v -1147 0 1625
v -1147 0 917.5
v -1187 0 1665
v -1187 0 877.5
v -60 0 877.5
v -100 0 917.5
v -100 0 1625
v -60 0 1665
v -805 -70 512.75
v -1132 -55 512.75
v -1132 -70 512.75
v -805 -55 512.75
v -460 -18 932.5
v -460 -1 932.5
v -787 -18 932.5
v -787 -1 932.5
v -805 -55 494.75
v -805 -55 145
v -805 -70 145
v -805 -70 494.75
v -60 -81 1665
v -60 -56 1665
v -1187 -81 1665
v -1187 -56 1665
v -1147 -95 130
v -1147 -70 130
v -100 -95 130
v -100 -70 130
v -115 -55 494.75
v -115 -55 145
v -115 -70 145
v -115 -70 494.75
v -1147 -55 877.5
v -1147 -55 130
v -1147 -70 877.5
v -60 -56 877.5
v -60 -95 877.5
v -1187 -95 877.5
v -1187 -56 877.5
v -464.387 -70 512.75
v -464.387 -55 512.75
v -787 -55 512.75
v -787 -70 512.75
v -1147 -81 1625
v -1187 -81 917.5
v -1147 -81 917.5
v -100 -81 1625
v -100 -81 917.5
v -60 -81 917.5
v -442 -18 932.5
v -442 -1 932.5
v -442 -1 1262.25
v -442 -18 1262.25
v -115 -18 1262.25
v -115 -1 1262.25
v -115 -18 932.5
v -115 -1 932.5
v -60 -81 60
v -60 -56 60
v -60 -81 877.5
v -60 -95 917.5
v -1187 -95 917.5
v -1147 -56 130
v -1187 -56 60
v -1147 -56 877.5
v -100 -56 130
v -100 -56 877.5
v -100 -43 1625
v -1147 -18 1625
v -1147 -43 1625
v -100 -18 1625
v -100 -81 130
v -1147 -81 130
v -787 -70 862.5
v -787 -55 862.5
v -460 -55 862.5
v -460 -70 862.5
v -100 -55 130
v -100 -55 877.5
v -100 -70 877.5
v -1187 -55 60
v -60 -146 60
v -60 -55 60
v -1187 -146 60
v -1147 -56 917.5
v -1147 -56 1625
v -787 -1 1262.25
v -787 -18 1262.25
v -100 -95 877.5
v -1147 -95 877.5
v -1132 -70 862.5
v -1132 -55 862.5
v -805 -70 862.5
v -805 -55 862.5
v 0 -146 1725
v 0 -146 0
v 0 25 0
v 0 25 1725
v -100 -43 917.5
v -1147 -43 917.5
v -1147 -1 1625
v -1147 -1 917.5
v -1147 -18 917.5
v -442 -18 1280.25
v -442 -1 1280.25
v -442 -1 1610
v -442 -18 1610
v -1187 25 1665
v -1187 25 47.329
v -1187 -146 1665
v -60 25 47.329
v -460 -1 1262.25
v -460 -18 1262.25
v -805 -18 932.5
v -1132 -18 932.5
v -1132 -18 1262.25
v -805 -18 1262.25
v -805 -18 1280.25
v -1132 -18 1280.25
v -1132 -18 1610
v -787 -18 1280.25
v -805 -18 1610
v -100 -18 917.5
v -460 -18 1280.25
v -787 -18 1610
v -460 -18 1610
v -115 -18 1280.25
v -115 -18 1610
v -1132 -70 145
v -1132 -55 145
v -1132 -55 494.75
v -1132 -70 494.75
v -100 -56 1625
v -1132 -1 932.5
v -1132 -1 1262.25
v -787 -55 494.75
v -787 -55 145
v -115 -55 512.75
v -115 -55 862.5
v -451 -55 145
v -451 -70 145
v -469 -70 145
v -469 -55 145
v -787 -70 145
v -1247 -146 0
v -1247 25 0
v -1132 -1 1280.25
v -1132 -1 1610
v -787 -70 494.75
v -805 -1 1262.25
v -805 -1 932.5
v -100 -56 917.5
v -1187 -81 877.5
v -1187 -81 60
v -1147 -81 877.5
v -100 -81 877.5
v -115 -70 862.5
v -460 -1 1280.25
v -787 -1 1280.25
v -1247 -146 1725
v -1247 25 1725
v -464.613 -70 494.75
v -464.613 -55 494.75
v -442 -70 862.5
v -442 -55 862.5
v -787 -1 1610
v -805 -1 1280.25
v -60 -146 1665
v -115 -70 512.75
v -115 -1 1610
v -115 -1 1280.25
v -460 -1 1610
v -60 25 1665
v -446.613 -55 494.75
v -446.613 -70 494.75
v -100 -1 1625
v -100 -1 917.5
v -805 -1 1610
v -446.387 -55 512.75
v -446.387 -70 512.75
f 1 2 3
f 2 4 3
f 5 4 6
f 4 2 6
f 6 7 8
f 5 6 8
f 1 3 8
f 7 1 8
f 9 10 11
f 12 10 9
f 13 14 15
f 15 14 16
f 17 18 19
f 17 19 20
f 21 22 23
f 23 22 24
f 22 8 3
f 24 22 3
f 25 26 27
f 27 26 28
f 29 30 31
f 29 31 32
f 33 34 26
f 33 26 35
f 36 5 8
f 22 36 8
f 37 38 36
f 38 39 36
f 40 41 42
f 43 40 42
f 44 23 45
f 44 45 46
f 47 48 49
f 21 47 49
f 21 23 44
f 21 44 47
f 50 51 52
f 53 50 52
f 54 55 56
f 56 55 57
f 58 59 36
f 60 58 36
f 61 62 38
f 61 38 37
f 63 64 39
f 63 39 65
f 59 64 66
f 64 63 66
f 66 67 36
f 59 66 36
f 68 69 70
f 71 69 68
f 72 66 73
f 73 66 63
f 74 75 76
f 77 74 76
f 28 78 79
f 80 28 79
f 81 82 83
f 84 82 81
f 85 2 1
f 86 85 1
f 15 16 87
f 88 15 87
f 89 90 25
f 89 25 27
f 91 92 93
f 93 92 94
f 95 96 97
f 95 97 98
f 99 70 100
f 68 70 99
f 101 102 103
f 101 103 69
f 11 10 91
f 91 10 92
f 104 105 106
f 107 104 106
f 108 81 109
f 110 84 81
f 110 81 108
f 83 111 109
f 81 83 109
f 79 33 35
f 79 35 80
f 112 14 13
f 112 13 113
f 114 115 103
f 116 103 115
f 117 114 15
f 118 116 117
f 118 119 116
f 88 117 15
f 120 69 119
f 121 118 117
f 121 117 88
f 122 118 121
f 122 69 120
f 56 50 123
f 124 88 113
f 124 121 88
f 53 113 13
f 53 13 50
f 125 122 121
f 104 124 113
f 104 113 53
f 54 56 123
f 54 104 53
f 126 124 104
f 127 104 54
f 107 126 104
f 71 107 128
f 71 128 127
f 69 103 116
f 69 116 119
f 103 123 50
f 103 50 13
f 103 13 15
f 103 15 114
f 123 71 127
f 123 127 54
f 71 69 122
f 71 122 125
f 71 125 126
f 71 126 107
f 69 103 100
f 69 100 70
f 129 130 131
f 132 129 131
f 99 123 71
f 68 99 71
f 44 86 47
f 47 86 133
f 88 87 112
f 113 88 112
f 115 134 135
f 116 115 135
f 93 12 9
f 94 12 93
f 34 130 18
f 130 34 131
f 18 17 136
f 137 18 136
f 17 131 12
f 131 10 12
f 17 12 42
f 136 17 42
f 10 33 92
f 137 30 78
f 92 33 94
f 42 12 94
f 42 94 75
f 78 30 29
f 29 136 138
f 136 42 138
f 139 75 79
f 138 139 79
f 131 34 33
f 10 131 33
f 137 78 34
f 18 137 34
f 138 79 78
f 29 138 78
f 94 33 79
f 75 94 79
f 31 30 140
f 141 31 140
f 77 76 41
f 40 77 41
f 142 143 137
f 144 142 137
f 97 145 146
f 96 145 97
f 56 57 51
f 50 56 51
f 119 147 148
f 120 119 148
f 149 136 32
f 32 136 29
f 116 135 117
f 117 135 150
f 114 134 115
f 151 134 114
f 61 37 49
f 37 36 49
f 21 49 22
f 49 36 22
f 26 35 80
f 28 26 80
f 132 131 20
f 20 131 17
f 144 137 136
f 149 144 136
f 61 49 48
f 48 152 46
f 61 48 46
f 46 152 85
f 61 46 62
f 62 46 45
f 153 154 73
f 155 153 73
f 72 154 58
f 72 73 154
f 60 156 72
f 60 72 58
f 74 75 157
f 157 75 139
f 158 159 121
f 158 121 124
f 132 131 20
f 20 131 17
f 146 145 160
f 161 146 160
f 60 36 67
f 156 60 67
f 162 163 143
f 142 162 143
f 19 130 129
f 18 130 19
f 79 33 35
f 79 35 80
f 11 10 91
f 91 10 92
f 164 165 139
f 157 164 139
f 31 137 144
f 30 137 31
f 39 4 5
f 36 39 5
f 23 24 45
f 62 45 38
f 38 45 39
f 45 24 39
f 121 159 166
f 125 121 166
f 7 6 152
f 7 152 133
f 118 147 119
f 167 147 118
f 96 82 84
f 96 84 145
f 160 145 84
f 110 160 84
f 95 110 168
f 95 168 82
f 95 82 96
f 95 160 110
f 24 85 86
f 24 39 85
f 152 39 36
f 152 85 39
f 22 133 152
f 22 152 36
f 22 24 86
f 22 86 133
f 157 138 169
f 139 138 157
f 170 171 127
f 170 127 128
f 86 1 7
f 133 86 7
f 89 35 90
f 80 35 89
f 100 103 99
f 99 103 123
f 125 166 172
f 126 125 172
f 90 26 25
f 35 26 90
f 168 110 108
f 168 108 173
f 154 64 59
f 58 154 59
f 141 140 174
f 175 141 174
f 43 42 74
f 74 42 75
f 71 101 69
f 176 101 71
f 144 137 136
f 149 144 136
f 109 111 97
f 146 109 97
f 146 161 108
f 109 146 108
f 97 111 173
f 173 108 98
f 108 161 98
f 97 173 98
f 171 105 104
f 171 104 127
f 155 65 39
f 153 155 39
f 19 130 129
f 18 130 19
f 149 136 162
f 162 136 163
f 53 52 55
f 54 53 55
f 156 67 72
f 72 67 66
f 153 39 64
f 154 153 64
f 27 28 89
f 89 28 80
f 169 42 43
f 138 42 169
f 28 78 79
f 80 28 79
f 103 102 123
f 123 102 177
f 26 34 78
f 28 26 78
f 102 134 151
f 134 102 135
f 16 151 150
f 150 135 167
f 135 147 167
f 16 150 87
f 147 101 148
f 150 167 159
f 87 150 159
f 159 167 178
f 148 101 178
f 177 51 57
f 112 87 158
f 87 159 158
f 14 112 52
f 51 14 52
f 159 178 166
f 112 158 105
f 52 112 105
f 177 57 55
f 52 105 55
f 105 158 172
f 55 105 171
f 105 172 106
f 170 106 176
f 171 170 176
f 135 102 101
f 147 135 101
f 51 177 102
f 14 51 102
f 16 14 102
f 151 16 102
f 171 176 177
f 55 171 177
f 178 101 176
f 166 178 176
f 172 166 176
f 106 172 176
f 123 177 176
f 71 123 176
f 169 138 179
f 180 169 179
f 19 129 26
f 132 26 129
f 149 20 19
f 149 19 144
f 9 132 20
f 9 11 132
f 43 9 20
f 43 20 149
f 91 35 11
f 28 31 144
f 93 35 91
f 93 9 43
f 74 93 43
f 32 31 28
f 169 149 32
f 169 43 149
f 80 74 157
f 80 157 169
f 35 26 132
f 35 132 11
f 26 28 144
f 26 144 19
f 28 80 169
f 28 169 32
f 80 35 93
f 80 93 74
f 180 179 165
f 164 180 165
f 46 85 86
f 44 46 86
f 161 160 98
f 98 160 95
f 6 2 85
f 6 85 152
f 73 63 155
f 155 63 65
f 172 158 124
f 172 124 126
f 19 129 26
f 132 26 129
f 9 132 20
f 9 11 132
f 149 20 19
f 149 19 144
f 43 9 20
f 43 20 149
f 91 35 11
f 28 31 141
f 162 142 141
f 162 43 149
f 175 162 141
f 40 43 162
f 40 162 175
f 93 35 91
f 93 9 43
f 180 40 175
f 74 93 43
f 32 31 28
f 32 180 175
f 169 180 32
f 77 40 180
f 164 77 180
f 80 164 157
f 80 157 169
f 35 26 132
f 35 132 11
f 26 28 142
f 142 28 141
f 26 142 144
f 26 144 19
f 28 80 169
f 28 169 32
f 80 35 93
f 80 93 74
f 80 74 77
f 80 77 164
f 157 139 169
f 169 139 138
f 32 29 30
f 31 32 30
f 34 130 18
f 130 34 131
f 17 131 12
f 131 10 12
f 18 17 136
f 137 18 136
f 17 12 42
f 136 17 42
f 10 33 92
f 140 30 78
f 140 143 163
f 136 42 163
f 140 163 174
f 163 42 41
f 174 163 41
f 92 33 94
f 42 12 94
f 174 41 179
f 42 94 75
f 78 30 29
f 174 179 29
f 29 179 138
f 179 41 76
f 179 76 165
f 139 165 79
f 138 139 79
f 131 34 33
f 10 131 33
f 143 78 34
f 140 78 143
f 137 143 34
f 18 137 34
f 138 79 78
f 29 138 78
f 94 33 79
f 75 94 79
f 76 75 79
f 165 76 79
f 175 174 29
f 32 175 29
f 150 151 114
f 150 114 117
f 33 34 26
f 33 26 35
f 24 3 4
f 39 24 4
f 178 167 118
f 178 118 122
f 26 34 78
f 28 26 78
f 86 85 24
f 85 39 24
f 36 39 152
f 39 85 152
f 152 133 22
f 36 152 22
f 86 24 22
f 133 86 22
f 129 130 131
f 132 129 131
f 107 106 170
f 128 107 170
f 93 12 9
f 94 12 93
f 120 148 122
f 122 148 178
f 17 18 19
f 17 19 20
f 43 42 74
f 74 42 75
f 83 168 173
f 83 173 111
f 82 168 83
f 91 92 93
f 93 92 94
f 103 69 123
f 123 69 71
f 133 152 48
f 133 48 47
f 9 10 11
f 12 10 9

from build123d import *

# Parameters (mm, degrees)
F0_W          = 1247
F0_H          = 1725
F1_DEPTH      = 146
F1_DEPTH_BACK = 25
F0_W_2        = 1047
F0_H_2        = 707.5
F2_DEPTH      = 56
F3_START      = 56
F3_DEPTH      = 25
F4_START      = 1
F0_W_3        = 327
F0_H_3        = 329.75
F0_W_4        = 18
F4_DEPTH      = 17
F6_START      = 55
F5_W          = 1047
F5_H          = 747.5
F5_W_2        = 327
F5_H_2        = 349.75
F5_W_3        = 672
F6_DEPTH      = 15
F0_H_4        = 747.5
F0_H_5        = 349.75
F7_SIZE2      = 12.670755226
F7_SIZE       = 80
F8_W          = 1047
F8_H          = 747.5
F8_W_2        = 327
F8_H_2        = 349.75
F8_W_3        = 672
F9_DEPTH      = 25
F10_DEPTH     = 25
F12_DEPTH     = 14
F13_W         = 1047
F13_H         = 707.5
F14_DEPTH     = 25


with BuildPart() as f1:
    # F0 (on Front) → F1 (new body, two sides)
    with BuildSketch(Plane.XZ) as f1_sk:
        with Locations((-623.5, 862.5)):
            Rectangle(F0_W, F0_H)
        Polygon((-1187, 1665), (-60, 1665), (-60, 877.5), (-60, 60), (-1187, 60), (-1187, 877.5), align=None, mode=Mode.SUBTRACT)
    extrude(amount=F1_DEPTH)
    extrude(f1_sk.sketch, amount=-F1_DEPTH_BACK)

    # F7
    f7_edges = [f1.edges().sort_by_distance(p)[0] for p in [
        (-623.5, 25, 60),
    ]]
    f7_side = f1.faces().sort_by_distance((-623.5, -60.5, 60))[0]
    chamfer(f7_edges, length=F7_SIZE, length2=F7_SIZE2, reference=f7_side)


with BuildPart() as f2:
    # F0 (on Front) → F2 (new body)
    with BuildSketch(Plane.XZ):
        Polygon((-60, 877.5), (-60, 1665), (-1187, 1665), (-1187, 877.5), (-1147, 877.5), (-100, 877.5), align=None)
        with Locations((-623.5, 1271.25)):
            Rectangle(F0_W_2, F0_H_2, mode=Mode.SUBTRACT)
    extrude(amount=F2_DEPTH)


with BuildPart() as f3:
    # F0 (on Front) → F3 (new body)
    with BuildSketch(Plane.XZ.offset(F3_START)):
        Polygon((-60, 60), (-60, 877.5), (-100, 877.5), (-100, 130), (-1147, 130), (-1147, 877.5), (-1187, 877.5), (-1187, 60), align=None)
    extrude(amount=F3_DEPTH)


with BuildPart() as f4:
    # F0 (on Front) → F4 (new body)
    with BuildSketch(Plane.XZ.offset(F4_START)):
        with Locations((-623.5, 1271.25)):
            Rectangle(F0_W_2, F0_H_2)
        with Locations((-968.5, 1097.375)):
            Rectangle(F0_W_3, F0_H_3, mode=Mode.SUBTRACT)
        with Locations((-968.5, 1445.125)):
            Rectangle(F0_W_3, F0_H_3, mode=Mode.SUBTRACT)
        Polygon((-442, 1262.25), (-115, 1262.25), (-115, 932.5), (-442, 932.5), (-460, 932.5), (-787, 932.5), (-787, 1262.25), (-460, 1262.25), align=None, mode=Mode.SUBTRACT)
        with Locations((-623.5, 1445.125)):
            Rectangle(F0_W_3, F0_H_3, mode=Mode.SUBTRACT)
        with Locations((-278.5, 1445.125)):
            Rectangle(F0_W_3, F0_H_3, mode=Mode.SUBTRACT)
        with Locations((-451, 1097.375)):
            Rectangle(F0_W_4, F0_H_3)
    extrude(amount=F4_DEPTH)


with BuildPart() as f6:
    # F5 (on face) → F6 (new body)
    with BuildSketch(Plane.XZ.offset(F6_START)):
        with Locations((-623.5, 503.75)):
            Rectangle(F5_W, F5_H)
        with Locations((-968.5, 319.875)):
            Rectangle(F5_W_2, F5_H_2, mode=Mode.SUBTRACT)
        with Locations((-451, 319.875)):
            Rectangle(F5_W_3, F5_H_2, mode=Mode.SUBTRACT)
        with Locations((-968.5, 687.625)):
            Rectangle(F5_W_2, F5_H_2, mode=Mode.SUBTRACT)
        with Locations((-451, 687.625)):
            Rectangle(F5_W_3, F5_H_2, mode=Mode.SUBTRACT)
    extrude(amount=F6_DEPTH)


with BuildPart() as f6b:
    # F0 (on Front) → F6, piece 2 (new body)
    with BuildSketch(Plane.XZ.offset(F6_START)):
        with Locations((-623.5, 503.75)):
            Rectangle(F0_W_2, F0_H_4)
        with Locations((-968.5, 319.875)):
            Rectangle(F0_W_3, F0_H_5, mode=Mode.SUBTRACT)
        Polygon((-787, 145), (-787, 494.75), (-464.6128919861, 494.75), (-469, 145), align=None, mode=Mode.SUBTRACT)
        with Locations((-968.5, 687.625)):
            Rectangle(F0_W_3, F0_H_5, mode=Mode.SUBTRACT)
        Polygon((-446.6128919861, 494.75), (-115, 494.75), (-115, 145), (-451, 145), align=None, mode=Mode.SUBTRACT)
        Polygon((-787, 512.75), (-787, 862.5), (-460, 862.5), (-464.3871080139, 512.75), align=None, mode=Mode.SUBTRACT)
        Polygon((-442, 862.5), (-115, 862.5), (-115, 512.75), (-446.3871080139, 512.75), align=None, mode=Mode.SUBTRACT)
    extrude(amount=F6_DEPTH)


with BuildPart() as f9:
    # F8 (on face) → F9 (new body)
    with BuildSketch(Plane.XZ.offset(70)):
        with Locations((-623.5, 503.75)):
            Rectangle(F8_W, F8_H)
        with Locations((-968.5, 319.875)):
            Rectangle(F8_W_2, F8_H_2, mode=Mode.SUBTRACT)
        with Locations((-451, 319.875)):
            Rectangle(F8_W_3, F8_H_2, mode=Mode.SUBTRACT)
        with Locations((-968.5, 687.625)):
            Rectangle(F8_W_2, F8_H_2, mode=Mode.SUBTRACT)
        with Locations((-451, 687.625)):
            Rectangle(F8_W_3, F8_H_2, mode=Mode.SUBTRACT)
        with Locations((-968.5, 687.625)):
            Rectangle(F8_W_2, F8_H_2)
        with Locations((-451, 687.625)):
            Rectangle(F8_W_3, F8_H_2)
        with Locations((-968.5, 319.875)):
            Rectangle(F8_W_2, F8_H_2)
        with Locations((-451, 319.875)):
            Rectangle(F8_W_3, F8_H_2)
    extrude(amount=F9_DEPTH)


with BuildPart() as f10:
    # F10 (new): a face of the model
    f10_faces = [f2.part.faces().sort_by_distance(p)[0] for p in [
        (-73.7487644899, -56, 1271.25),
    ]]
    extrude(f10_faces, amount=F10_DEPTH)

    # F11 (on face) → F12 (join, through all)
    with BuildSketch(Plane.XZ.offset(81)):
        Polygon((-100, 917.5), (-1147, 917.5), (-1187, 917.5), (-1187, 877.5), (-60, 877.5), (-60, 917.5), align=None)
    extrude(amount=F12_DEPTH)


with BuildPart() as f14:
    # F13 (on face) → F14 (new body)
    with BuildSketch(Plane.XZ.offset(18)):
        with Locations((-623.5, 1271.25)):
            Rectangle(F13_W, F13_H)
    extrude(amount=F14_DEPTH)


solid = Compound([f1.part, f2.part, f3.part, f4.part, f6.part, f6b.part, f9.part, f10.part, f14.part])
